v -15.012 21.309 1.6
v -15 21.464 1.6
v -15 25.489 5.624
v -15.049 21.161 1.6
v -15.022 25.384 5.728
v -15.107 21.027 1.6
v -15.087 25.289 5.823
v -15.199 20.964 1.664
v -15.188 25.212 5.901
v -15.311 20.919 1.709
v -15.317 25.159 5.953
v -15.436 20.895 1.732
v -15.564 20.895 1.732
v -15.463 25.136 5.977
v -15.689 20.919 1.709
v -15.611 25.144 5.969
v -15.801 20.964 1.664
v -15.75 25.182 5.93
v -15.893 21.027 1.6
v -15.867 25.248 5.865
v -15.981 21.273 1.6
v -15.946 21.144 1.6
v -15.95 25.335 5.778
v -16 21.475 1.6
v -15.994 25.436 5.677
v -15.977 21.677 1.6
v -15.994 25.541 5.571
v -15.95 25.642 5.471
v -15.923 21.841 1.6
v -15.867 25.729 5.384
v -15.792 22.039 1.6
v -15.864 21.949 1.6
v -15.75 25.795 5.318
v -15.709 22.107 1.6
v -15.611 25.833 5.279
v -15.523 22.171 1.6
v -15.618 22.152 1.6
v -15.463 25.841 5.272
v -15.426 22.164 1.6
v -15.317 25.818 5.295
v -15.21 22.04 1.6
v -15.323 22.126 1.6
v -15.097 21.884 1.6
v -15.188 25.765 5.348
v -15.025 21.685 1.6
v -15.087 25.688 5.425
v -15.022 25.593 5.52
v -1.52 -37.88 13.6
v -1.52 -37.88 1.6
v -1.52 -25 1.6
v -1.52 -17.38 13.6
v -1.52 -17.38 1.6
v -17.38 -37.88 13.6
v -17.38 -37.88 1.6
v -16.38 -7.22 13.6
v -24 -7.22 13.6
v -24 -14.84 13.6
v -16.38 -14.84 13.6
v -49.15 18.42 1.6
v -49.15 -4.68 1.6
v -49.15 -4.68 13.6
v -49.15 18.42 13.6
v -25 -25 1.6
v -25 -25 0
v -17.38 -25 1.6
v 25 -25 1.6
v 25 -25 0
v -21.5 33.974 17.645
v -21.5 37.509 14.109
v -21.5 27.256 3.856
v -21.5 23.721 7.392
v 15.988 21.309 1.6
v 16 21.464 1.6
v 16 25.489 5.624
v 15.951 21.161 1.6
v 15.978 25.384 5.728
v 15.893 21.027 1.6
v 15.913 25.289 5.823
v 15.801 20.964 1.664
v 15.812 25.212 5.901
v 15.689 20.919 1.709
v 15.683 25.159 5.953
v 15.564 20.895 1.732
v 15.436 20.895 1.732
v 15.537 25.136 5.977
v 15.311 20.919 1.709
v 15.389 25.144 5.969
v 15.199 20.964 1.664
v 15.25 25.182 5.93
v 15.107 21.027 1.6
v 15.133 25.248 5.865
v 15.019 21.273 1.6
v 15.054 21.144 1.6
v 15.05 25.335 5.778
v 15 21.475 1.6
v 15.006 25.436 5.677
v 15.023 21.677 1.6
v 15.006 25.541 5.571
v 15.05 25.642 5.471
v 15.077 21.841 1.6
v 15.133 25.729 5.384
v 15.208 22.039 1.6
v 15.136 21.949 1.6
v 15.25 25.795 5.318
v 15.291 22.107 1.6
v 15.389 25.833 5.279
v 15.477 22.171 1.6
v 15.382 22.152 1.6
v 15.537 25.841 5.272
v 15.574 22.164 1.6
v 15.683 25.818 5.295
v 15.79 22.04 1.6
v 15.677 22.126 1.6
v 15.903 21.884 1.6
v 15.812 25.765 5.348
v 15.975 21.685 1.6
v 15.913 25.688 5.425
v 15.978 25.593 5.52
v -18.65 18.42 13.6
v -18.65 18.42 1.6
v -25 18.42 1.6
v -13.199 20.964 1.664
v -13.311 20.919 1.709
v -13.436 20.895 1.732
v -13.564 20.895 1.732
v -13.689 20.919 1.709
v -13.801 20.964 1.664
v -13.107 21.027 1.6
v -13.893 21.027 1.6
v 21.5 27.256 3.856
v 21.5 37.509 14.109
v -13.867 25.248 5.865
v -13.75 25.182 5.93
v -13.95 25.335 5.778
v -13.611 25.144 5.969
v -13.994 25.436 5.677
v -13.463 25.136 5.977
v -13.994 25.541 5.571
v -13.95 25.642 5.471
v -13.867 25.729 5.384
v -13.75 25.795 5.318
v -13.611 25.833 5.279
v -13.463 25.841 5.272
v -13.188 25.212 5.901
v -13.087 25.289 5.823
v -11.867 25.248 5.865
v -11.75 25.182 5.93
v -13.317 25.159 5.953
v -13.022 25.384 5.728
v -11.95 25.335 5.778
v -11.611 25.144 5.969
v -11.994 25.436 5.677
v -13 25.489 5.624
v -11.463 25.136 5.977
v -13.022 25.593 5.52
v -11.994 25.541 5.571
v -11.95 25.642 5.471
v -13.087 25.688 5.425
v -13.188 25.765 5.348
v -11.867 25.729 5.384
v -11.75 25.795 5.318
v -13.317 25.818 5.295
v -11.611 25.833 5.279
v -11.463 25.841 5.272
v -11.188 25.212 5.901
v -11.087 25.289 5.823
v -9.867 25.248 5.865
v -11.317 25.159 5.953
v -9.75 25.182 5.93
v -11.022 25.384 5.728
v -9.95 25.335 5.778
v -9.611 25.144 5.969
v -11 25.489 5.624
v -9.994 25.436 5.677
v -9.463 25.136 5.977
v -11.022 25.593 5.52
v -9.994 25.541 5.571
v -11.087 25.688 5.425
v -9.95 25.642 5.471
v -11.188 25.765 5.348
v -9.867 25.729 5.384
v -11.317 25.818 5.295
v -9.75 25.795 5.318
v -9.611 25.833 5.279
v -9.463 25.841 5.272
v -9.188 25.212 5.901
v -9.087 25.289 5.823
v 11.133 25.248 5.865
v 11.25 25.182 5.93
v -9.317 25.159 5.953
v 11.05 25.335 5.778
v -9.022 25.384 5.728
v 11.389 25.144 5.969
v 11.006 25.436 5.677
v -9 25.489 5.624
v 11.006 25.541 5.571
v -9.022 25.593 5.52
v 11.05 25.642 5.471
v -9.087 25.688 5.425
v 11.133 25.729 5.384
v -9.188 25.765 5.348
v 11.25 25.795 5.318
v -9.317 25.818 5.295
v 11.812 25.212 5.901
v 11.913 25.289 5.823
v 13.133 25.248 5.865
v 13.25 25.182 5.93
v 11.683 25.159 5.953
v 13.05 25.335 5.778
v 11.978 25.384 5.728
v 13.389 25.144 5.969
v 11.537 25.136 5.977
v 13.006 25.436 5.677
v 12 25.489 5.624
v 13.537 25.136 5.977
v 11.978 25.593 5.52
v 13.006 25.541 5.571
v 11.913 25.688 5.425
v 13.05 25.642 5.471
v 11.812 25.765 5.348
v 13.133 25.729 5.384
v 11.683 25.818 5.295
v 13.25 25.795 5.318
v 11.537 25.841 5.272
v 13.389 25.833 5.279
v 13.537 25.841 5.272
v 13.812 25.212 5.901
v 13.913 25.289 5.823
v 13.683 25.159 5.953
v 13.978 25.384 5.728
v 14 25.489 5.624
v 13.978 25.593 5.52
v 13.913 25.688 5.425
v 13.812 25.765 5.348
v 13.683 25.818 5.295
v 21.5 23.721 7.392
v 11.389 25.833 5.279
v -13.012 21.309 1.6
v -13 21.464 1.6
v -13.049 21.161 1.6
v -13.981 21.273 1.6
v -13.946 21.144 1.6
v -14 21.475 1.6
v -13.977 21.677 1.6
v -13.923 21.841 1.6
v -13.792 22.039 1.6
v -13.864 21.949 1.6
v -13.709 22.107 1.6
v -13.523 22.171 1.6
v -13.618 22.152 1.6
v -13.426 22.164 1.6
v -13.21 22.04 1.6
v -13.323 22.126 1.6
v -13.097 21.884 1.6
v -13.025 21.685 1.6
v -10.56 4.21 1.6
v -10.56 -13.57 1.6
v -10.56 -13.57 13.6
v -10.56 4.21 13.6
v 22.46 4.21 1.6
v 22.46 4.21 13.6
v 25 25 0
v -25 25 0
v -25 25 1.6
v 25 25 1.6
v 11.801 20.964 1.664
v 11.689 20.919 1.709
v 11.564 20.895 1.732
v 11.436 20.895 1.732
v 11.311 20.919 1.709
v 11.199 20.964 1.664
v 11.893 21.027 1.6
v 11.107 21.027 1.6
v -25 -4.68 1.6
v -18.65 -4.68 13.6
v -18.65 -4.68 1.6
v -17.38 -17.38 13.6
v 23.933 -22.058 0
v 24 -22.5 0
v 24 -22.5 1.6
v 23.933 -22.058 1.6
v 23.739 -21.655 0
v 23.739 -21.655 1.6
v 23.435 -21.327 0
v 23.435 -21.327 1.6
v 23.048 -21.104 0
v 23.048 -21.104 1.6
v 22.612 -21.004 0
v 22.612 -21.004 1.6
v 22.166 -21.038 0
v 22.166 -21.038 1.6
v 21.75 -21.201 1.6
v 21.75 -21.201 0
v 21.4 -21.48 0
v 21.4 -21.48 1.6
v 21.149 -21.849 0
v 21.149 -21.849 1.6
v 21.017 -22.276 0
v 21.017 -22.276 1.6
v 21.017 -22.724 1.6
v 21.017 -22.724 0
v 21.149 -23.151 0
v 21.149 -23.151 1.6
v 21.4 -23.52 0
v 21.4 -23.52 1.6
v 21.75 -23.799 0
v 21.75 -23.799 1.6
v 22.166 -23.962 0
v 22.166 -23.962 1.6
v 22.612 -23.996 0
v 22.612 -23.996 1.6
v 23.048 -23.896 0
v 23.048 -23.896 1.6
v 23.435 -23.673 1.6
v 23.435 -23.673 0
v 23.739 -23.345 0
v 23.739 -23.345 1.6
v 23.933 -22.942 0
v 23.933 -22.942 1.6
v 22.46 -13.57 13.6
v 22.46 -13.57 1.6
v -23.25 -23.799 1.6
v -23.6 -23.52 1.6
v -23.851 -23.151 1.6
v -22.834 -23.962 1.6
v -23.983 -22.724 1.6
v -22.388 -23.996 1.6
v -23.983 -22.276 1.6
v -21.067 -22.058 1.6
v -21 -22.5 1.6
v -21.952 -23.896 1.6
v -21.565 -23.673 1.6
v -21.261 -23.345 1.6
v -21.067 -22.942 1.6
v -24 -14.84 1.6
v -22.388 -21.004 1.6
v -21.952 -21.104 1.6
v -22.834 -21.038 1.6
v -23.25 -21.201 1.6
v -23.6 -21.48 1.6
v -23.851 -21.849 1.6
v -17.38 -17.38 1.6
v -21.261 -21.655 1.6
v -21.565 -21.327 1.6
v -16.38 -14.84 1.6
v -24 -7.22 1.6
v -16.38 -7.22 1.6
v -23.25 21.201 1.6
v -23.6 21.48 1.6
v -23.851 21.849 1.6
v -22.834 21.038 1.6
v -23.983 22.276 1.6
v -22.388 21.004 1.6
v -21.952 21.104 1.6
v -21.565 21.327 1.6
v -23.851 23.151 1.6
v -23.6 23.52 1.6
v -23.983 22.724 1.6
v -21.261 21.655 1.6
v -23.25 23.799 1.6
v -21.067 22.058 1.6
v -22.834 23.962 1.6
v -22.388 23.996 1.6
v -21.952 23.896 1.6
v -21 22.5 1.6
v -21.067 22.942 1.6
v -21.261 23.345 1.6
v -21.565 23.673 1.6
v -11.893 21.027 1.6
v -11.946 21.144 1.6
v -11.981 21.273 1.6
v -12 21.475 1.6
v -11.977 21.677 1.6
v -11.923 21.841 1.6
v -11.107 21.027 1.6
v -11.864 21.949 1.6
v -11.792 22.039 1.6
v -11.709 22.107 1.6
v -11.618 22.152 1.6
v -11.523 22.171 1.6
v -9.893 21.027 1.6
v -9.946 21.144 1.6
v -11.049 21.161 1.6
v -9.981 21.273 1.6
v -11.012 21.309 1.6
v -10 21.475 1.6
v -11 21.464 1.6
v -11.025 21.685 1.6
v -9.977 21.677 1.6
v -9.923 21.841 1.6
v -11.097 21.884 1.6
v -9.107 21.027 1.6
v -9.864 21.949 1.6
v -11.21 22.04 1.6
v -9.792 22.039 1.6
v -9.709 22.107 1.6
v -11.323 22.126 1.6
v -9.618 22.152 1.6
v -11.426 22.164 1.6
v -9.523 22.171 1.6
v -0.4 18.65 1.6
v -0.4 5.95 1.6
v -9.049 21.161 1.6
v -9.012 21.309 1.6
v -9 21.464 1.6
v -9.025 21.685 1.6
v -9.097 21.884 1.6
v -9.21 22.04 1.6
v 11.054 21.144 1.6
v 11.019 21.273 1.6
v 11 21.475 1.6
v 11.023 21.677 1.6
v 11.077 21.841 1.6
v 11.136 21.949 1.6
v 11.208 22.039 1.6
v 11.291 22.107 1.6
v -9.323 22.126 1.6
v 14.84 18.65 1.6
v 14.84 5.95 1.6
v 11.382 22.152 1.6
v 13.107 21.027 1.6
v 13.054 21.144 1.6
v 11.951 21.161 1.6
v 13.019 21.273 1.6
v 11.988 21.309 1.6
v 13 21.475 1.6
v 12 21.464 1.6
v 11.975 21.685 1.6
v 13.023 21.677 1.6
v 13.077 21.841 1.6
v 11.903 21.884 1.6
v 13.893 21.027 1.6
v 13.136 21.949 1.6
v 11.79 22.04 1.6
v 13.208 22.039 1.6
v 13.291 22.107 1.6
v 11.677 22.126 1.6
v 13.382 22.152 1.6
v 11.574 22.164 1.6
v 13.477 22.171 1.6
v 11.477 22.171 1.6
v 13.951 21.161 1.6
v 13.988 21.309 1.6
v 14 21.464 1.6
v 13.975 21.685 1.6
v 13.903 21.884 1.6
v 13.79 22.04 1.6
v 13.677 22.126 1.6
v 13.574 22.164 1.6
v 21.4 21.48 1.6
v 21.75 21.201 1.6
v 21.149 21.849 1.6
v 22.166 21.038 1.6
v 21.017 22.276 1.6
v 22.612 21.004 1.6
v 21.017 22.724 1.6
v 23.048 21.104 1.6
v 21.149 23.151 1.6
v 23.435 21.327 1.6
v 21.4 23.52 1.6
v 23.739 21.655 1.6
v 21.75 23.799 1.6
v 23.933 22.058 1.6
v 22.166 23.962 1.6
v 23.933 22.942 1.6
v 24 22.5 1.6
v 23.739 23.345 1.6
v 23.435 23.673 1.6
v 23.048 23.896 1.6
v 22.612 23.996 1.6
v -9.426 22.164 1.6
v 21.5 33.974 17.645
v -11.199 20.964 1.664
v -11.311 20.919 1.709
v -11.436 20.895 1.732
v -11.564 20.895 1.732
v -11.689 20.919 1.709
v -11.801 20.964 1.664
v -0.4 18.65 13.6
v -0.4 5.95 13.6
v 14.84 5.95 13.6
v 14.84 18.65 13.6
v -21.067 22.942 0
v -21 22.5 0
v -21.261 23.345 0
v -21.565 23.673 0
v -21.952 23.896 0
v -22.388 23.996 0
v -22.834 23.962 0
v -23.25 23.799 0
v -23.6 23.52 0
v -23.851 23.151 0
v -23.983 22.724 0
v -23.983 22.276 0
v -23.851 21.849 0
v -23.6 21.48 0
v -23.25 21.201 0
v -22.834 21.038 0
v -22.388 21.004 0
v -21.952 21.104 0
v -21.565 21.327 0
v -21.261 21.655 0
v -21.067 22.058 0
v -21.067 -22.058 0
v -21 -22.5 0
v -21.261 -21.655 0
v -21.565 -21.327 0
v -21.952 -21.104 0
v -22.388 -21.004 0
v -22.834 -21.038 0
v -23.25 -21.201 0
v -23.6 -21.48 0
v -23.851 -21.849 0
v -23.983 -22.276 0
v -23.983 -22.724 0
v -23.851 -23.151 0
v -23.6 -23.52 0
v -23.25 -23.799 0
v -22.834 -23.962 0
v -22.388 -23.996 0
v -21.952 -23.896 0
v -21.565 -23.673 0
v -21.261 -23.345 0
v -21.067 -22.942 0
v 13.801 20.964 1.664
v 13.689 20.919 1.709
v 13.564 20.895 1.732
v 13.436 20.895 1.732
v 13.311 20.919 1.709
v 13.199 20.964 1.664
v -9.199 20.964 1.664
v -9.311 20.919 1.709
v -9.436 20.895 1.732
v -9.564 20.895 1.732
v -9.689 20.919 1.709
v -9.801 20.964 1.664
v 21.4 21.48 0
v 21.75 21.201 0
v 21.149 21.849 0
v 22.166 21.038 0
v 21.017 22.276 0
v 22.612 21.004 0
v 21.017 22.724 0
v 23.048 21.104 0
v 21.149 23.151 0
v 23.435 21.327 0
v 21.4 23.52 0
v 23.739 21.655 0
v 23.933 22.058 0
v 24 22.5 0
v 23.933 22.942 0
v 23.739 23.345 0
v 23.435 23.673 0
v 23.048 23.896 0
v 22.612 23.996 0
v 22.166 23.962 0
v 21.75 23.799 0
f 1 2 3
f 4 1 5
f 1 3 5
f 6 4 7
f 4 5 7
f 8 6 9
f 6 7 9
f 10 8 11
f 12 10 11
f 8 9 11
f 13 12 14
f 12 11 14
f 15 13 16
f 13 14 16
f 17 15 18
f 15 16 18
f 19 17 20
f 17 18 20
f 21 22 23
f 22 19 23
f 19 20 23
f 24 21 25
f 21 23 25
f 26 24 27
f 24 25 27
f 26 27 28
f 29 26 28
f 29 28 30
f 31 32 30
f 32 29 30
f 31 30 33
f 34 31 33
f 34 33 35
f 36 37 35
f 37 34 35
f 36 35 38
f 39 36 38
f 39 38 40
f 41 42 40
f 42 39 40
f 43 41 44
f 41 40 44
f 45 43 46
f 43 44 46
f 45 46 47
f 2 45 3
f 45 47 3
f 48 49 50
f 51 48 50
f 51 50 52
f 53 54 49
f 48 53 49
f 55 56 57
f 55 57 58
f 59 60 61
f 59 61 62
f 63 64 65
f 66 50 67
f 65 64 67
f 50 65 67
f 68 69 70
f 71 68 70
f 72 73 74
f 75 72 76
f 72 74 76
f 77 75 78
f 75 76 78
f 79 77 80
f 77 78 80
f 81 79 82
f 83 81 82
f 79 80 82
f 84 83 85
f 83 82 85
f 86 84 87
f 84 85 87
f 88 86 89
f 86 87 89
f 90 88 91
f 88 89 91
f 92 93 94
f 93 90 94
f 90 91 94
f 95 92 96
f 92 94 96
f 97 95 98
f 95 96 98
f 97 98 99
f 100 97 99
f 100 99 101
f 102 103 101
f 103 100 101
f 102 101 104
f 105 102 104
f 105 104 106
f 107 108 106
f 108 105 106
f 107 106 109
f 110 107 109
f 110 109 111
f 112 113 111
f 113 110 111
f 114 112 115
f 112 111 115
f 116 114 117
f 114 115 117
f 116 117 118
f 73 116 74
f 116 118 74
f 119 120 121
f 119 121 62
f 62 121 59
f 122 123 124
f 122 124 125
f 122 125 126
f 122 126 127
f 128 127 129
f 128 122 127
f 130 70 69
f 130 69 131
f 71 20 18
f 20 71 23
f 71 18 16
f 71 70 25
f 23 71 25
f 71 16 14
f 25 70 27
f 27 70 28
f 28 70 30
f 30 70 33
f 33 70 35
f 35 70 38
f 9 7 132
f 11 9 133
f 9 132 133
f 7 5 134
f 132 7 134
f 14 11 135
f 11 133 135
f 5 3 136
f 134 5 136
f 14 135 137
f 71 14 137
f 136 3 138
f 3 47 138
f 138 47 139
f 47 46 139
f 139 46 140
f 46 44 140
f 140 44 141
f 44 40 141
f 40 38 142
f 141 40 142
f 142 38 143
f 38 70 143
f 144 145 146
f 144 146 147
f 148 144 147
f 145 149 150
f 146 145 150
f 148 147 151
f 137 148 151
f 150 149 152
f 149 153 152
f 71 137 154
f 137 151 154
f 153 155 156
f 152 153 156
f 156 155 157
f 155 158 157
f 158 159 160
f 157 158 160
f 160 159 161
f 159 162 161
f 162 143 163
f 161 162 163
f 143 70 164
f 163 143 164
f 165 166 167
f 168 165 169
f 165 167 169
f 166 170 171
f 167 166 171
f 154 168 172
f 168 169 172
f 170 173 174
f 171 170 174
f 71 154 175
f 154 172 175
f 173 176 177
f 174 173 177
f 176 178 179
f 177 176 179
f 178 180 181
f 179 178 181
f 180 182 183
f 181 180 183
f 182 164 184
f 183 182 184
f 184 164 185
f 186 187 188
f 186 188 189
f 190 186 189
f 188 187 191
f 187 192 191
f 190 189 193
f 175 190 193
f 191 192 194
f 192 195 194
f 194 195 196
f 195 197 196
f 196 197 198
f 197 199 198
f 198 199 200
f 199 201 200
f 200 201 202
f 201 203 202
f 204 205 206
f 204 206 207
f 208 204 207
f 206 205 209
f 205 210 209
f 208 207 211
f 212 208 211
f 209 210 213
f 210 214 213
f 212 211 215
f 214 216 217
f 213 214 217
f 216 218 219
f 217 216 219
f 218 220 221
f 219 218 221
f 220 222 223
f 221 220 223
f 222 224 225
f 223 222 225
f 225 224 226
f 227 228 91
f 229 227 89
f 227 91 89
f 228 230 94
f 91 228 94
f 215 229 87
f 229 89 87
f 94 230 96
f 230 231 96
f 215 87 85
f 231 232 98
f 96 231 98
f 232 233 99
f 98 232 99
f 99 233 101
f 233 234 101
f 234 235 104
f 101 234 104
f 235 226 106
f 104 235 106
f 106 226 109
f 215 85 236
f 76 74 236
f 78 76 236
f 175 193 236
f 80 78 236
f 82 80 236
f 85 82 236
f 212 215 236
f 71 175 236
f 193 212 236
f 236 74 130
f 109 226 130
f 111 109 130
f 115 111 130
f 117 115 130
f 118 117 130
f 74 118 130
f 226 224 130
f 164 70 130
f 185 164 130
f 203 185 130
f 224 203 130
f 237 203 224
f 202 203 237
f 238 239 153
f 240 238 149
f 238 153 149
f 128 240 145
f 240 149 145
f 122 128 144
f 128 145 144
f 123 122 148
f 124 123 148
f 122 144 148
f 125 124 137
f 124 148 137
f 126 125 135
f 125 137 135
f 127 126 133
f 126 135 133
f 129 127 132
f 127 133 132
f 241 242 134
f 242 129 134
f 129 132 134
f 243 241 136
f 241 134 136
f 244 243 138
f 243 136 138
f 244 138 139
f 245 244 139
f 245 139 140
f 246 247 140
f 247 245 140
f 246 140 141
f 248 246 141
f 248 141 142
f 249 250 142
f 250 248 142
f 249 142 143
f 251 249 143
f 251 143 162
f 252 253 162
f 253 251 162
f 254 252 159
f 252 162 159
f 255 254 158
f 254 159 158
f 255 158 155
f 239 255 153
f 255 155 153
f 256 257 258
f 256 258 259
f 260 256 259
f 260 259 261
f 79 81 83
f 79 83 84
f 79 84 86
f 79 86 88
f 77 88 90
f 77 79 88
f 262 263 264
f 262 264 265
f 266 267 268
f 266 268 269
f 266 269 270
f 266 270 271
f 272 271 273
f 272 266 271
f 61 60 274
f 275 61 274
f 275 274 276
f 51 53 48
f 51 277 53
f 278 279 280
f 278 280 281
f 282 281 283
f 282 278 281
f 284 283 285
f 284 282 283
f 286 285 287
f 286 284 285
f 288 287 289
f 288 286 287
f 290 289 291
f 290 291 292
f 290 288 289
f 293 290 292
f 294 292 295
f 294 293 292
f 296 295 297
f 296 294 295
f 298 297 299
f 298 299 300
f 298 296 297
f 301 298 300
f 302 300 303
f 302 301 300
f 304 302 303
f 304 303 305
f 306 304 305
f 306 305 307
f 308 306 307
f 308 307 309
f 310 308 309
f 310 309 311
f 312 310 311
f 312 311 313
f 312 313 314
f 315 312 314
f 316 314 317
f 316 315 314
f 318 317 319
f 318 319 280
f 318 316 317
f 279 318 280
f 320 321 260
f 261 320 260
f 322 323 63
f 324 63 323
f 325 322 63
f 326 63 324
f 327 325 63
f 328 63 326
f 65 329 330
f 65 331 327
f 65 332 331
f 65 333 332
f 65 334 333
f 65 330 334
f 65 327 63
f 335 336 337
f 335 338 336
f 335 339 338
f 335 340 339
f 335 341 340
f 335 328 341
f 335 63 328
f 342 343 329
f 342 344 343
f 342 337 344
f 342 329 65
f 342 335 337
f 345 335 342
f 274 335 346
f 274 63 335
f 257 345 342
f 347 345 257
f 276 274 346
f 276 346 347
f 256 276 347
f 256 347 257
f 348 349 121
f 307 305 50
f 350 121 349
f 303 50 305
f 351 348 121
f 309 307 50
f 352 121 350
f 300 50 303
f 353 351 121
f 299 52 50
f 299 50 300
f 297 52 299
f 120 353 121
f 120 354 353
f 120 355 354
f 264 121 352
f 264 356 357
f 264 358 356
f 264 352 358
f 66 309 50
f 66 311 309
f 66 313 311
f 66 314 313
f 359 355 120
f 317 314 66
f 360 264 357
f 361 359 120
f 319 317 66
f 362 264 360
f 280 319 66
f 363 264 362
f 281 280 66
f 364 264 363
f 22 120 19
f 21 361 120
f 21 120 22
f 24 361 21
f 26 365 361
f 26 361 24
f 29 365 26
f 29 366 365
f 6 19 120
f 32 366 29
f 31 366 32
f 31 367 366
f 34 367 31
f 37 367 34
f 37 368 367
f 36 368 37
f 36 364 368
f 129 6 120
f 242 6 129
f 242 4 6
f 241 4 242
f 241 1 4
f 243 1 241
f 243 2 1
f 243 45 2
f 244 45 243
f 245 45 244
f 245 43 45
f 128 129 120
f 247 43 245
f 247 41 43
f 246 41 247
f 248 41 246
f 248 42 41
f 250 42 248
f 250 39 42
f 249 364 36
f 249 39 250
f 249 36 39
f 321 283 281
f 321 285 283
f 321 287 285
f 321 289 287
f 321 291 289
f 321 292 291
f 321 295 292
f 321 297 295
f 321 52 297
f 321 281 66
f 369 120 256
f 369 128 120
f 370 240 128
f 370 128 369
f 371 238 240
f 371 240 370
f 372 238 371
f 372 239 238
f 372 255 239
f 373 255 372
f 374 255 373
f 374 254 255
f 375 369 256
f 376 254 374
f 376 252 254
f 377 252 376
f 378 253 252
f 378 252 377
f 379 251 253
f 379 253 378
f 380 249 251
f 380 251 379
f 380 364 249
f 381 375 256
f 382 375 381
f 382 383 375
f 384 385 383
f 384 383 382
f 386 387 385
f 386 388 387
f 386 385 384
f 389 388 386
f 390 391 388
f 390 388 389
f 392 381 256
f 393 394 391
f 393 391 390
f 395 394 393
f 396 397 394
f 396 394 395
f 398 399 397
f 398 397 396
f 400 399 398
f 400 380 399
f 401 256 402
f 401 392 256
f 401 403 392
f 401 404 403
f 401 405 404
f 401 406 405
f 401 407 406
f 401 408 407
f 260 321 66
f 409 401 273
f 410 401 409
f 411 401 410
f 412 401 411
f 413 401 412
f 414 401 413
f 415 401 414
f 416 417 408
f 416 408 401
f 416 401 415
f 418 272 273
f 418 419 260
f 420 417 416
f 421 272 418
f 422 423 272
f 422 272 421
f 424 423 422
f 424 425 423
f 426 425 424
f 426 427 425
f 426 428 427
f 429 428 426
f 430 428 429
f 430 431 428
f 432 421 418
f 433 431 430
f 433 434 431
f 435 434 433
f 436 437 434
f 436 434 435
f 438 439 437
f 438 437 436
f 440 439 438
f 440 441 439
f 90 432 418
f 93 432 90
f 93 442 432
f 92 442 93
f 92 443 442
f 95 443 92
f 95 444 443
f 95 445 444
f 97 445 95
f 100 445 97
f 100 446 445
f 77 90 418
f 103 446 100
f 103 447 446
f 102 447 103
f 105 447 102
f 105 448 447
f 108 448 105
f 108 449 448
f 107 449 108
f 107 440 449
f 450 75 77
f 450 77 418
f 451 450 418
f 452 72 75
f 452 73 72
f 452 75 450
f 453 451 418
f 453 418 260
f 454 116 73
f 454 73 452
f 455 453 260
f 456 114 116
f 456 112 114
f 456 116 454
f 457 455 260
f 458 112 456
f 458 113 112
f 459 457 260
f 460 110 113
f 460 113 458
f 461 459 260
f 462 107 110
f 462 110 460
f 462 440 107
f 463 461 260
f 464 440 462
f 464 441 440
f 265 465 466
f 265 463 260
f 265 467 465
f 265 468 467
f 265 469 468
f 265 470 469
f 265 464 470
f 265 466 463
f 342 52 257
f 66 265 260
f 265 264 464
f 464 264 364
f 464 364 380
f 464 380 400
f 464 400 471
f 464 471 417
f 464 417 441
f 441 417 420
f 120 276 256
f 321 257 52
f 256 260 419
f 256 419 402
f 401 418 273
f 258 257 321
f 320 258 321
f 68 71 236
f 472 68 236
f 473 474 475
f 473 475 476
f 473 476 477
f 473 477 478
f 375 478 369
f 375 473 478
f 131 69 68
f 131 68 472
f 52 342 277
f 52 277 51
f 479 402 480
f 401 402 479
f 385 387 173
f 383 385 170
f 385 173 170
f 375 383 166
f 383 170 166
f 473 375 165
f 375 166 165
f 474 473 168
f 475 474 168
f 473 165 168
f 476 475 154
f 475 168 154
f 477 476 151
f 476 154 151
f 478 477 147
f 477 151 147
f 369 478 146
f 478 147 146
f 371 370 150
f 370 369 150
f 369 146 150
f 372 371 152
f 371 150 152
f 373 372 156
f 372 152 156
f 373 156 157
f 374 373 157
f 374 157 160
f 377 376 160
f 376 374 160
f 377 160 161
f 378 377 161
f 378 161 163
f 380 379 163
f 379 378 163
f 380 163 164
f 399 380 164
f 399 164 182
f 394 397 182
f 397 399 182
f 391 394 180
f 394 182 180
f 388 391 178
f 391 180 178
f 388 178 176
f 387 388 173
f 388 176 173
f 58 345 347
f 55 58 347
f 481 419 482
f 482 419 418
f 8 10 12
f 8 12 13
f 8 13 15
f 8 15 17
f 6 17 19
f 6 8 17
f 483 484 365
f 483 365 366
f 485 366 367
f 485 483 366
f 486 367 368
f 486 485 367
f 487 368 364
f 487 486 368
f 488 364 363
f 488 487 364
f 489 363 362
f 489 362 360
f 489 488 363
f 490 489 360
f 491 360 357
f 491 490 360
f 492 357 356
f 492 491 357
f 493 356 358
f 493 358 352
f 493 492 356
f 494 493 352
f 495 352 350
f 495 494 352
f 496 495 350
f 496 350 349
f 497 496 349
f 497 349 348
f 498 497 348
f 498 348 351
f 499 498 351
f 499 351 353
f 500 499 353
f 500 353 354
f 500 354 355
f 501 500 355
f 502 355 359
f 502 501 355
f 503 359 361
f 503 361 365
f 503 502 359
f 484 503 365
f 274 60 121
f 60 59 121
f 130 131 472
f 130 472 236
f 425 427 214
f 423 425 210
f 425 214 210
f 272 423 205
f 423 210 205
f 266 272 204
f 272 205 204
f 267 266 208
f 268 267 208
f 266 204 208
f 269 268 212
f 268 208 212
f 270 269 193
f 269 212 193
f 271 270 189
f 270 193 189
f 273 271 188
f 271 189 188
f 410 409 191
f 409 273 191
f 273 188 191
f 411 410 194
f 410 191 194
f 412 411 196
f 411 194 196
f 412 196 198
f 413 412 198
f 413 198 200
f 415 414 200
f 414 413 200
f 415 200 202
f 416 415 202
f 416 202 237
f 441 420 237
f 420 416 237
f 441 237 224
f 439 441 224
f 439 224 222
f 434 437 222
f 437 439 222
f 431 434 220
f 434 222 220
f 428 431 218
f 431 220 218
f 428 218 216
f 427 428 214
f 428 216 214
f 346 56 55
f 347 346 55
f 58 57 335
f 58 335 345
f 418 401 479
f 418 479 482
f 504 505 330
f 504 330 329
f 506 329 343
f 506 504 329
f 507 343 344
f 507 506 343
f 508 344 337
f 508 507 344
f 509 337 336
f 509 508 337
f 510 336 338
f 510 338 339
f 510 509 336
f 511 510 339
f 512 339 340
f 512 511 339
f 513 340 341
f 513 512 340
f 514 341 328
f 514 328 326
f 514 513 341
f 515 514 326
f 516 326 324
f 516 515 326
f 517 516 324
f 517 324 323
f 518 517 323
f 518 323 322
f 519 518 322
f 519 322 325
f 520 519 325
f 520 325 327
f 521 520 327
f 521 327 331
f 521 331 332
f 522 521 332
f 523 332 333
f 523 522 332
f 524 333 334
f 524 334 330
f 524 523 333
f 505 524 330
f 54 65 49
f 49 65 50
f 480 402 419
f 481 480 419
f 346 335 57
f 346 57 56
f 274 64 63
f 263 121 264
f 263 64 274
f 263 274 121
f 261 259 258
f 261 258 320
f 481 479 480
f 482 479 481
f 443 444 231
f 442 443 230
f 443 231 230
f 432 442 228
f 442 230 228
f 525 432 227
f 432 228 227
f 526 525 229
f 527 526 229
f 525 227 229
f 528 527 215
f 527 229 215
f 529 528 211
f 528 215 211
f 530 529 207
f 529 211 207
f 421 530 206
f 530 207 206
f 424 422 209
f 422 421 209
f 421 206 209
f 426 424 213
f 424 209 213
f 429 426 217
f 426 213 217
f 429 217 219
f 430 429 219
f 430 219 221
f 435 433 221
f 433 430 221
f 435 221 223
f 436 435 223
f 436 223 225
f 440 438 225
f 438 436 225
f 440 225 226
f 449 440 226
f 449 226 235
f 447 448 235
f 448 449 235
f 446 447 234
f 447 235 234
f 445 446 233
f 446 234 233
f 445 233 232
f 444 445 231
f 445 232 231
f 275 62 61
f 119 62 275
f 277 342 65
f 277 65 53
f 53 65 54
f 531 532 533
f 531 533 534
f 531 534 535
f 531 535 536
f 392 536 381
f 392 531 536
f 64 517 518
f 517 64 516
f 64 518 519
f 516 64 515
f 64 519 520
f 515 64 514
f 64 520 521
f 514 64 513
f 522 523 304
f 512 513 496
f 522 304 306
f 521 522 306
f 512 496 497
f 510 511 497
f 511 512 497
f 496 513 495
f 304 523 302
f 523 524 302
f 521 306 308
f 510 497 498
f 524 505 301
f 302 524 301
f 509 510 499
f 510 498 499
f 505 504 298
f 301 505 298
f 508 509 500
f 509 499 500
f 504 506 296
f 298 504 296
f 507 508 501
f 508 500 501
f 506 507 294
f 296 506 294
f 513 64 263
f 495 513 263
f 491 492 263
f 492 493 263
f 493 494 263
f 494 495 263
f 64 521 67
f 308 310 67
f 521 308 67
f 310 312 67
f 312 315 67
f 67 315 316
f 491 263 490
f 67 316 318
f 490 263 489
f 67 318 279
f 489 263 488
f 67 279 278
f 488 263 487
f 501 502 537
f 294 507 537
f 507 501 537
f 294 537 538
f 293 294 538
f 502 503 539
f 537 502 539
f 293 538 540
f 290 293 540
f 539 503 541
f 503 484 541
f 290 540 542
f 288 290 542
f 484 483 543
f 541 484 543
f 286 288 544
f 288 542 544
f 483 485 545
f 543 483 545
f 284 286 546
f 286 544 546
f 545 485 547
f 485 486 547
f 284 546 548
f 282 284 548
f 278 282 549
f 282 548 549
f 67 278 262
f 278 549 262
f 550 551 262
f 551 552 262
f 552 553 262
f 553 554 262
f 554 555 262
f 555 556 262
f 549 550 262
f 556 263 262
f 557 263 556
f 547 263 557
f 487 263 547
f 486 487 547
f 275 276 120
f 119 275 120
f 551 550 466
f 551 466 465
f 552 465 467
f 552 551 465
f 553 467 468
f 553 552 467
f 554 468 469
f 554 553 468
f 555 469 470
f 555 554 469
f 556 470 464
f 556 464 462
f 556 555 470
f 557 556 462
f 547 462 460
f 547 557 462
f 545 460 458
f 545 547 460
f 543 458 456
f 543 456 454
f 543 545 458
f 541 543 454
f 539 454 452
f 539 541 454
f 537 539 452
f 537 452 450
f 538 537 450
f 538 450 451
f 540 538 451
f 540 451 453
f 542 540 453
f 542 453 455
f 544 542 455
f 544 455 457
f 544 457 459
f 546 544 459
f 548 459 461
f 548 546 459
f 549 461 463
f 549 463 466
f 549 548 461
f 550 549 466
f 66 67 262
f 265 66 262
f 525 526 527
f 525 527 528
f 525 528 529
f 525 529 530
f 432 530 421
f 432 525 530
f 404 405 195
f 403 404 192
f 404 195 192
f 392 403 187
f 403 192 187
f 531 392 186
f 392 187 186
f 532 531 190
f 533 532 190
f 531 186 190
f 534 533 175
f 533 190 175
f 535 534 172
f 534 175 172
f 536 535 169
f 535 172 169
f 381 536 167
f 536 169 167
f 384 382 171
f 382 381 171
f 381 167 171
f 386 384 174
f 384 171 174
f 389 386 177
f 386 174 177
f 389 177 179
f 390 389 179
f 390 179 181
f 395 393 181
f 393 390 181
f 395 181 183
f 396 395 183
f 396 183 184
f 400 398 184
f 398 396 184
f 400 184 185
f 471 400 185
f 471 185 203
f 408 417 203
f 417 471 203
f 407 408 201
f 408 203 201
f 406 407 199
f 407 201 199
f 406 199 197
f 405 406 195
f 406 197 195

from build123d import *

# Parameters (mm, degrees)
F0_W     = 50
F0_H     = 50
F0_R     = 1.5
F1_DEPTH = 1.6
F2_W     = 33.02
F2_H     = 17.78
F2_W_2   = 15.24
F2_H_2   = 12.7
F2_W_3   = 6.35
F2_H_3   = 23.1
F2_W_4   = 24.15
F2_W_5   = 7.62
F2_H_4   = 7.62
F2_W_6   = 15.86
F2_H_5   = 12.88
F3_DEPTH = 12
F5_W     = 43
F5_H     = 14.5
F6_DEPTH = 5
F7_R     = 0.5
F8_DEPTH = 6


with BuildPart() as f1:
    # F0 (on Top) → F1 (new body)
    with BuildSketch(Plane.XY):
        Rectangle(F0_W, F0_H)
        with Locations((-22.5, -22.5)):
            Circle(F0_R, mode=Mode.SUBTRACT)
        with Locations((22.5, -22.5)):
            Circle(F0_R, mode=Mode.SUBTRACT)
        with Locations((-22.5, 22.5)):
            Circle(F0_R, mode=Mode.SUBTRACT)
        with Locations((22.5, 22.5)):
            Circle(F0_R, mode=Mode.SUBTRACT)
    extrude(amount=F1_DEPTH)

    # F2 (on face) → F3 (join)
    with BuildSketch(Plane.XY.offset(1.6)):
        with Locations((5.95, -4.68)):
            Rectangle(F2_W, F2_H)
        with Locations((7.22, 12.3)):
            Rectangle(F2_W_2, F2_H_2)
        with Locations((-21.825, 6.87)):
            Rectangle(F2_W_3, F2_H_3)
        with Locations((-37.075, 6.87)):
            Rectangle(F2_W_4, F2_H_3)
        with Locations((-20.19, -11.03)):
            Rectangle(F2_W_5, F2_H_4)
        with Locations((-9.45, -31.44)):
            Rectangle(F2_W_6, F2_H_5)
        with Locations((-9.45, -21.19)):
            Rectangle(F2_W_6, F2_H_4)
    extrude(amount=F3_DEPTH)



with BuildPart() as f6:
    # F5 (on face) → F6 (new body)
    with BuildSketch(Plane(origin=(0, 11.7, -11.7), x_dir=(1, 0, 0), z_dir=(0, 0.707107, -0.707107))):
        with Locations((0, -29.25)):
            Rectangle(F5_W, F5_H)
    extrude(amount=-F6_DEPTH)


with BuildPart() as f1_1:
    add(f1.part)

    add(f6.part)  # F8 merges F6
    # F7 (on face) → F8 (join)
    with BuildSketch(Plane(origin=(0, 15.556349, 15.556349), x_dir=(1, 0, 0), z_dir=(0, -0.707107, -0.707107))):
        with Locations((15.5, -14.046299)):
            Circle(F7_R)
        with Locations((13.5, -14.046299)):
            Circle(F7_R)
        with Locations((11.5, -14.046299)):
            Circle(F7_R)
        with Locations((-15.5, -14.046299)):
            Circle(F7_R)
        with Locations((-13.5, -14.046299)):
            Circle(F7_R)
        with Locations((-11.5, -14.046299)):
            Circle(F7_R)
        with Locations((-9.5, -14.046299)):
            Circle(F7_R)
    extrude(amount=F8_DEPTH)


solid = f1_1.part
